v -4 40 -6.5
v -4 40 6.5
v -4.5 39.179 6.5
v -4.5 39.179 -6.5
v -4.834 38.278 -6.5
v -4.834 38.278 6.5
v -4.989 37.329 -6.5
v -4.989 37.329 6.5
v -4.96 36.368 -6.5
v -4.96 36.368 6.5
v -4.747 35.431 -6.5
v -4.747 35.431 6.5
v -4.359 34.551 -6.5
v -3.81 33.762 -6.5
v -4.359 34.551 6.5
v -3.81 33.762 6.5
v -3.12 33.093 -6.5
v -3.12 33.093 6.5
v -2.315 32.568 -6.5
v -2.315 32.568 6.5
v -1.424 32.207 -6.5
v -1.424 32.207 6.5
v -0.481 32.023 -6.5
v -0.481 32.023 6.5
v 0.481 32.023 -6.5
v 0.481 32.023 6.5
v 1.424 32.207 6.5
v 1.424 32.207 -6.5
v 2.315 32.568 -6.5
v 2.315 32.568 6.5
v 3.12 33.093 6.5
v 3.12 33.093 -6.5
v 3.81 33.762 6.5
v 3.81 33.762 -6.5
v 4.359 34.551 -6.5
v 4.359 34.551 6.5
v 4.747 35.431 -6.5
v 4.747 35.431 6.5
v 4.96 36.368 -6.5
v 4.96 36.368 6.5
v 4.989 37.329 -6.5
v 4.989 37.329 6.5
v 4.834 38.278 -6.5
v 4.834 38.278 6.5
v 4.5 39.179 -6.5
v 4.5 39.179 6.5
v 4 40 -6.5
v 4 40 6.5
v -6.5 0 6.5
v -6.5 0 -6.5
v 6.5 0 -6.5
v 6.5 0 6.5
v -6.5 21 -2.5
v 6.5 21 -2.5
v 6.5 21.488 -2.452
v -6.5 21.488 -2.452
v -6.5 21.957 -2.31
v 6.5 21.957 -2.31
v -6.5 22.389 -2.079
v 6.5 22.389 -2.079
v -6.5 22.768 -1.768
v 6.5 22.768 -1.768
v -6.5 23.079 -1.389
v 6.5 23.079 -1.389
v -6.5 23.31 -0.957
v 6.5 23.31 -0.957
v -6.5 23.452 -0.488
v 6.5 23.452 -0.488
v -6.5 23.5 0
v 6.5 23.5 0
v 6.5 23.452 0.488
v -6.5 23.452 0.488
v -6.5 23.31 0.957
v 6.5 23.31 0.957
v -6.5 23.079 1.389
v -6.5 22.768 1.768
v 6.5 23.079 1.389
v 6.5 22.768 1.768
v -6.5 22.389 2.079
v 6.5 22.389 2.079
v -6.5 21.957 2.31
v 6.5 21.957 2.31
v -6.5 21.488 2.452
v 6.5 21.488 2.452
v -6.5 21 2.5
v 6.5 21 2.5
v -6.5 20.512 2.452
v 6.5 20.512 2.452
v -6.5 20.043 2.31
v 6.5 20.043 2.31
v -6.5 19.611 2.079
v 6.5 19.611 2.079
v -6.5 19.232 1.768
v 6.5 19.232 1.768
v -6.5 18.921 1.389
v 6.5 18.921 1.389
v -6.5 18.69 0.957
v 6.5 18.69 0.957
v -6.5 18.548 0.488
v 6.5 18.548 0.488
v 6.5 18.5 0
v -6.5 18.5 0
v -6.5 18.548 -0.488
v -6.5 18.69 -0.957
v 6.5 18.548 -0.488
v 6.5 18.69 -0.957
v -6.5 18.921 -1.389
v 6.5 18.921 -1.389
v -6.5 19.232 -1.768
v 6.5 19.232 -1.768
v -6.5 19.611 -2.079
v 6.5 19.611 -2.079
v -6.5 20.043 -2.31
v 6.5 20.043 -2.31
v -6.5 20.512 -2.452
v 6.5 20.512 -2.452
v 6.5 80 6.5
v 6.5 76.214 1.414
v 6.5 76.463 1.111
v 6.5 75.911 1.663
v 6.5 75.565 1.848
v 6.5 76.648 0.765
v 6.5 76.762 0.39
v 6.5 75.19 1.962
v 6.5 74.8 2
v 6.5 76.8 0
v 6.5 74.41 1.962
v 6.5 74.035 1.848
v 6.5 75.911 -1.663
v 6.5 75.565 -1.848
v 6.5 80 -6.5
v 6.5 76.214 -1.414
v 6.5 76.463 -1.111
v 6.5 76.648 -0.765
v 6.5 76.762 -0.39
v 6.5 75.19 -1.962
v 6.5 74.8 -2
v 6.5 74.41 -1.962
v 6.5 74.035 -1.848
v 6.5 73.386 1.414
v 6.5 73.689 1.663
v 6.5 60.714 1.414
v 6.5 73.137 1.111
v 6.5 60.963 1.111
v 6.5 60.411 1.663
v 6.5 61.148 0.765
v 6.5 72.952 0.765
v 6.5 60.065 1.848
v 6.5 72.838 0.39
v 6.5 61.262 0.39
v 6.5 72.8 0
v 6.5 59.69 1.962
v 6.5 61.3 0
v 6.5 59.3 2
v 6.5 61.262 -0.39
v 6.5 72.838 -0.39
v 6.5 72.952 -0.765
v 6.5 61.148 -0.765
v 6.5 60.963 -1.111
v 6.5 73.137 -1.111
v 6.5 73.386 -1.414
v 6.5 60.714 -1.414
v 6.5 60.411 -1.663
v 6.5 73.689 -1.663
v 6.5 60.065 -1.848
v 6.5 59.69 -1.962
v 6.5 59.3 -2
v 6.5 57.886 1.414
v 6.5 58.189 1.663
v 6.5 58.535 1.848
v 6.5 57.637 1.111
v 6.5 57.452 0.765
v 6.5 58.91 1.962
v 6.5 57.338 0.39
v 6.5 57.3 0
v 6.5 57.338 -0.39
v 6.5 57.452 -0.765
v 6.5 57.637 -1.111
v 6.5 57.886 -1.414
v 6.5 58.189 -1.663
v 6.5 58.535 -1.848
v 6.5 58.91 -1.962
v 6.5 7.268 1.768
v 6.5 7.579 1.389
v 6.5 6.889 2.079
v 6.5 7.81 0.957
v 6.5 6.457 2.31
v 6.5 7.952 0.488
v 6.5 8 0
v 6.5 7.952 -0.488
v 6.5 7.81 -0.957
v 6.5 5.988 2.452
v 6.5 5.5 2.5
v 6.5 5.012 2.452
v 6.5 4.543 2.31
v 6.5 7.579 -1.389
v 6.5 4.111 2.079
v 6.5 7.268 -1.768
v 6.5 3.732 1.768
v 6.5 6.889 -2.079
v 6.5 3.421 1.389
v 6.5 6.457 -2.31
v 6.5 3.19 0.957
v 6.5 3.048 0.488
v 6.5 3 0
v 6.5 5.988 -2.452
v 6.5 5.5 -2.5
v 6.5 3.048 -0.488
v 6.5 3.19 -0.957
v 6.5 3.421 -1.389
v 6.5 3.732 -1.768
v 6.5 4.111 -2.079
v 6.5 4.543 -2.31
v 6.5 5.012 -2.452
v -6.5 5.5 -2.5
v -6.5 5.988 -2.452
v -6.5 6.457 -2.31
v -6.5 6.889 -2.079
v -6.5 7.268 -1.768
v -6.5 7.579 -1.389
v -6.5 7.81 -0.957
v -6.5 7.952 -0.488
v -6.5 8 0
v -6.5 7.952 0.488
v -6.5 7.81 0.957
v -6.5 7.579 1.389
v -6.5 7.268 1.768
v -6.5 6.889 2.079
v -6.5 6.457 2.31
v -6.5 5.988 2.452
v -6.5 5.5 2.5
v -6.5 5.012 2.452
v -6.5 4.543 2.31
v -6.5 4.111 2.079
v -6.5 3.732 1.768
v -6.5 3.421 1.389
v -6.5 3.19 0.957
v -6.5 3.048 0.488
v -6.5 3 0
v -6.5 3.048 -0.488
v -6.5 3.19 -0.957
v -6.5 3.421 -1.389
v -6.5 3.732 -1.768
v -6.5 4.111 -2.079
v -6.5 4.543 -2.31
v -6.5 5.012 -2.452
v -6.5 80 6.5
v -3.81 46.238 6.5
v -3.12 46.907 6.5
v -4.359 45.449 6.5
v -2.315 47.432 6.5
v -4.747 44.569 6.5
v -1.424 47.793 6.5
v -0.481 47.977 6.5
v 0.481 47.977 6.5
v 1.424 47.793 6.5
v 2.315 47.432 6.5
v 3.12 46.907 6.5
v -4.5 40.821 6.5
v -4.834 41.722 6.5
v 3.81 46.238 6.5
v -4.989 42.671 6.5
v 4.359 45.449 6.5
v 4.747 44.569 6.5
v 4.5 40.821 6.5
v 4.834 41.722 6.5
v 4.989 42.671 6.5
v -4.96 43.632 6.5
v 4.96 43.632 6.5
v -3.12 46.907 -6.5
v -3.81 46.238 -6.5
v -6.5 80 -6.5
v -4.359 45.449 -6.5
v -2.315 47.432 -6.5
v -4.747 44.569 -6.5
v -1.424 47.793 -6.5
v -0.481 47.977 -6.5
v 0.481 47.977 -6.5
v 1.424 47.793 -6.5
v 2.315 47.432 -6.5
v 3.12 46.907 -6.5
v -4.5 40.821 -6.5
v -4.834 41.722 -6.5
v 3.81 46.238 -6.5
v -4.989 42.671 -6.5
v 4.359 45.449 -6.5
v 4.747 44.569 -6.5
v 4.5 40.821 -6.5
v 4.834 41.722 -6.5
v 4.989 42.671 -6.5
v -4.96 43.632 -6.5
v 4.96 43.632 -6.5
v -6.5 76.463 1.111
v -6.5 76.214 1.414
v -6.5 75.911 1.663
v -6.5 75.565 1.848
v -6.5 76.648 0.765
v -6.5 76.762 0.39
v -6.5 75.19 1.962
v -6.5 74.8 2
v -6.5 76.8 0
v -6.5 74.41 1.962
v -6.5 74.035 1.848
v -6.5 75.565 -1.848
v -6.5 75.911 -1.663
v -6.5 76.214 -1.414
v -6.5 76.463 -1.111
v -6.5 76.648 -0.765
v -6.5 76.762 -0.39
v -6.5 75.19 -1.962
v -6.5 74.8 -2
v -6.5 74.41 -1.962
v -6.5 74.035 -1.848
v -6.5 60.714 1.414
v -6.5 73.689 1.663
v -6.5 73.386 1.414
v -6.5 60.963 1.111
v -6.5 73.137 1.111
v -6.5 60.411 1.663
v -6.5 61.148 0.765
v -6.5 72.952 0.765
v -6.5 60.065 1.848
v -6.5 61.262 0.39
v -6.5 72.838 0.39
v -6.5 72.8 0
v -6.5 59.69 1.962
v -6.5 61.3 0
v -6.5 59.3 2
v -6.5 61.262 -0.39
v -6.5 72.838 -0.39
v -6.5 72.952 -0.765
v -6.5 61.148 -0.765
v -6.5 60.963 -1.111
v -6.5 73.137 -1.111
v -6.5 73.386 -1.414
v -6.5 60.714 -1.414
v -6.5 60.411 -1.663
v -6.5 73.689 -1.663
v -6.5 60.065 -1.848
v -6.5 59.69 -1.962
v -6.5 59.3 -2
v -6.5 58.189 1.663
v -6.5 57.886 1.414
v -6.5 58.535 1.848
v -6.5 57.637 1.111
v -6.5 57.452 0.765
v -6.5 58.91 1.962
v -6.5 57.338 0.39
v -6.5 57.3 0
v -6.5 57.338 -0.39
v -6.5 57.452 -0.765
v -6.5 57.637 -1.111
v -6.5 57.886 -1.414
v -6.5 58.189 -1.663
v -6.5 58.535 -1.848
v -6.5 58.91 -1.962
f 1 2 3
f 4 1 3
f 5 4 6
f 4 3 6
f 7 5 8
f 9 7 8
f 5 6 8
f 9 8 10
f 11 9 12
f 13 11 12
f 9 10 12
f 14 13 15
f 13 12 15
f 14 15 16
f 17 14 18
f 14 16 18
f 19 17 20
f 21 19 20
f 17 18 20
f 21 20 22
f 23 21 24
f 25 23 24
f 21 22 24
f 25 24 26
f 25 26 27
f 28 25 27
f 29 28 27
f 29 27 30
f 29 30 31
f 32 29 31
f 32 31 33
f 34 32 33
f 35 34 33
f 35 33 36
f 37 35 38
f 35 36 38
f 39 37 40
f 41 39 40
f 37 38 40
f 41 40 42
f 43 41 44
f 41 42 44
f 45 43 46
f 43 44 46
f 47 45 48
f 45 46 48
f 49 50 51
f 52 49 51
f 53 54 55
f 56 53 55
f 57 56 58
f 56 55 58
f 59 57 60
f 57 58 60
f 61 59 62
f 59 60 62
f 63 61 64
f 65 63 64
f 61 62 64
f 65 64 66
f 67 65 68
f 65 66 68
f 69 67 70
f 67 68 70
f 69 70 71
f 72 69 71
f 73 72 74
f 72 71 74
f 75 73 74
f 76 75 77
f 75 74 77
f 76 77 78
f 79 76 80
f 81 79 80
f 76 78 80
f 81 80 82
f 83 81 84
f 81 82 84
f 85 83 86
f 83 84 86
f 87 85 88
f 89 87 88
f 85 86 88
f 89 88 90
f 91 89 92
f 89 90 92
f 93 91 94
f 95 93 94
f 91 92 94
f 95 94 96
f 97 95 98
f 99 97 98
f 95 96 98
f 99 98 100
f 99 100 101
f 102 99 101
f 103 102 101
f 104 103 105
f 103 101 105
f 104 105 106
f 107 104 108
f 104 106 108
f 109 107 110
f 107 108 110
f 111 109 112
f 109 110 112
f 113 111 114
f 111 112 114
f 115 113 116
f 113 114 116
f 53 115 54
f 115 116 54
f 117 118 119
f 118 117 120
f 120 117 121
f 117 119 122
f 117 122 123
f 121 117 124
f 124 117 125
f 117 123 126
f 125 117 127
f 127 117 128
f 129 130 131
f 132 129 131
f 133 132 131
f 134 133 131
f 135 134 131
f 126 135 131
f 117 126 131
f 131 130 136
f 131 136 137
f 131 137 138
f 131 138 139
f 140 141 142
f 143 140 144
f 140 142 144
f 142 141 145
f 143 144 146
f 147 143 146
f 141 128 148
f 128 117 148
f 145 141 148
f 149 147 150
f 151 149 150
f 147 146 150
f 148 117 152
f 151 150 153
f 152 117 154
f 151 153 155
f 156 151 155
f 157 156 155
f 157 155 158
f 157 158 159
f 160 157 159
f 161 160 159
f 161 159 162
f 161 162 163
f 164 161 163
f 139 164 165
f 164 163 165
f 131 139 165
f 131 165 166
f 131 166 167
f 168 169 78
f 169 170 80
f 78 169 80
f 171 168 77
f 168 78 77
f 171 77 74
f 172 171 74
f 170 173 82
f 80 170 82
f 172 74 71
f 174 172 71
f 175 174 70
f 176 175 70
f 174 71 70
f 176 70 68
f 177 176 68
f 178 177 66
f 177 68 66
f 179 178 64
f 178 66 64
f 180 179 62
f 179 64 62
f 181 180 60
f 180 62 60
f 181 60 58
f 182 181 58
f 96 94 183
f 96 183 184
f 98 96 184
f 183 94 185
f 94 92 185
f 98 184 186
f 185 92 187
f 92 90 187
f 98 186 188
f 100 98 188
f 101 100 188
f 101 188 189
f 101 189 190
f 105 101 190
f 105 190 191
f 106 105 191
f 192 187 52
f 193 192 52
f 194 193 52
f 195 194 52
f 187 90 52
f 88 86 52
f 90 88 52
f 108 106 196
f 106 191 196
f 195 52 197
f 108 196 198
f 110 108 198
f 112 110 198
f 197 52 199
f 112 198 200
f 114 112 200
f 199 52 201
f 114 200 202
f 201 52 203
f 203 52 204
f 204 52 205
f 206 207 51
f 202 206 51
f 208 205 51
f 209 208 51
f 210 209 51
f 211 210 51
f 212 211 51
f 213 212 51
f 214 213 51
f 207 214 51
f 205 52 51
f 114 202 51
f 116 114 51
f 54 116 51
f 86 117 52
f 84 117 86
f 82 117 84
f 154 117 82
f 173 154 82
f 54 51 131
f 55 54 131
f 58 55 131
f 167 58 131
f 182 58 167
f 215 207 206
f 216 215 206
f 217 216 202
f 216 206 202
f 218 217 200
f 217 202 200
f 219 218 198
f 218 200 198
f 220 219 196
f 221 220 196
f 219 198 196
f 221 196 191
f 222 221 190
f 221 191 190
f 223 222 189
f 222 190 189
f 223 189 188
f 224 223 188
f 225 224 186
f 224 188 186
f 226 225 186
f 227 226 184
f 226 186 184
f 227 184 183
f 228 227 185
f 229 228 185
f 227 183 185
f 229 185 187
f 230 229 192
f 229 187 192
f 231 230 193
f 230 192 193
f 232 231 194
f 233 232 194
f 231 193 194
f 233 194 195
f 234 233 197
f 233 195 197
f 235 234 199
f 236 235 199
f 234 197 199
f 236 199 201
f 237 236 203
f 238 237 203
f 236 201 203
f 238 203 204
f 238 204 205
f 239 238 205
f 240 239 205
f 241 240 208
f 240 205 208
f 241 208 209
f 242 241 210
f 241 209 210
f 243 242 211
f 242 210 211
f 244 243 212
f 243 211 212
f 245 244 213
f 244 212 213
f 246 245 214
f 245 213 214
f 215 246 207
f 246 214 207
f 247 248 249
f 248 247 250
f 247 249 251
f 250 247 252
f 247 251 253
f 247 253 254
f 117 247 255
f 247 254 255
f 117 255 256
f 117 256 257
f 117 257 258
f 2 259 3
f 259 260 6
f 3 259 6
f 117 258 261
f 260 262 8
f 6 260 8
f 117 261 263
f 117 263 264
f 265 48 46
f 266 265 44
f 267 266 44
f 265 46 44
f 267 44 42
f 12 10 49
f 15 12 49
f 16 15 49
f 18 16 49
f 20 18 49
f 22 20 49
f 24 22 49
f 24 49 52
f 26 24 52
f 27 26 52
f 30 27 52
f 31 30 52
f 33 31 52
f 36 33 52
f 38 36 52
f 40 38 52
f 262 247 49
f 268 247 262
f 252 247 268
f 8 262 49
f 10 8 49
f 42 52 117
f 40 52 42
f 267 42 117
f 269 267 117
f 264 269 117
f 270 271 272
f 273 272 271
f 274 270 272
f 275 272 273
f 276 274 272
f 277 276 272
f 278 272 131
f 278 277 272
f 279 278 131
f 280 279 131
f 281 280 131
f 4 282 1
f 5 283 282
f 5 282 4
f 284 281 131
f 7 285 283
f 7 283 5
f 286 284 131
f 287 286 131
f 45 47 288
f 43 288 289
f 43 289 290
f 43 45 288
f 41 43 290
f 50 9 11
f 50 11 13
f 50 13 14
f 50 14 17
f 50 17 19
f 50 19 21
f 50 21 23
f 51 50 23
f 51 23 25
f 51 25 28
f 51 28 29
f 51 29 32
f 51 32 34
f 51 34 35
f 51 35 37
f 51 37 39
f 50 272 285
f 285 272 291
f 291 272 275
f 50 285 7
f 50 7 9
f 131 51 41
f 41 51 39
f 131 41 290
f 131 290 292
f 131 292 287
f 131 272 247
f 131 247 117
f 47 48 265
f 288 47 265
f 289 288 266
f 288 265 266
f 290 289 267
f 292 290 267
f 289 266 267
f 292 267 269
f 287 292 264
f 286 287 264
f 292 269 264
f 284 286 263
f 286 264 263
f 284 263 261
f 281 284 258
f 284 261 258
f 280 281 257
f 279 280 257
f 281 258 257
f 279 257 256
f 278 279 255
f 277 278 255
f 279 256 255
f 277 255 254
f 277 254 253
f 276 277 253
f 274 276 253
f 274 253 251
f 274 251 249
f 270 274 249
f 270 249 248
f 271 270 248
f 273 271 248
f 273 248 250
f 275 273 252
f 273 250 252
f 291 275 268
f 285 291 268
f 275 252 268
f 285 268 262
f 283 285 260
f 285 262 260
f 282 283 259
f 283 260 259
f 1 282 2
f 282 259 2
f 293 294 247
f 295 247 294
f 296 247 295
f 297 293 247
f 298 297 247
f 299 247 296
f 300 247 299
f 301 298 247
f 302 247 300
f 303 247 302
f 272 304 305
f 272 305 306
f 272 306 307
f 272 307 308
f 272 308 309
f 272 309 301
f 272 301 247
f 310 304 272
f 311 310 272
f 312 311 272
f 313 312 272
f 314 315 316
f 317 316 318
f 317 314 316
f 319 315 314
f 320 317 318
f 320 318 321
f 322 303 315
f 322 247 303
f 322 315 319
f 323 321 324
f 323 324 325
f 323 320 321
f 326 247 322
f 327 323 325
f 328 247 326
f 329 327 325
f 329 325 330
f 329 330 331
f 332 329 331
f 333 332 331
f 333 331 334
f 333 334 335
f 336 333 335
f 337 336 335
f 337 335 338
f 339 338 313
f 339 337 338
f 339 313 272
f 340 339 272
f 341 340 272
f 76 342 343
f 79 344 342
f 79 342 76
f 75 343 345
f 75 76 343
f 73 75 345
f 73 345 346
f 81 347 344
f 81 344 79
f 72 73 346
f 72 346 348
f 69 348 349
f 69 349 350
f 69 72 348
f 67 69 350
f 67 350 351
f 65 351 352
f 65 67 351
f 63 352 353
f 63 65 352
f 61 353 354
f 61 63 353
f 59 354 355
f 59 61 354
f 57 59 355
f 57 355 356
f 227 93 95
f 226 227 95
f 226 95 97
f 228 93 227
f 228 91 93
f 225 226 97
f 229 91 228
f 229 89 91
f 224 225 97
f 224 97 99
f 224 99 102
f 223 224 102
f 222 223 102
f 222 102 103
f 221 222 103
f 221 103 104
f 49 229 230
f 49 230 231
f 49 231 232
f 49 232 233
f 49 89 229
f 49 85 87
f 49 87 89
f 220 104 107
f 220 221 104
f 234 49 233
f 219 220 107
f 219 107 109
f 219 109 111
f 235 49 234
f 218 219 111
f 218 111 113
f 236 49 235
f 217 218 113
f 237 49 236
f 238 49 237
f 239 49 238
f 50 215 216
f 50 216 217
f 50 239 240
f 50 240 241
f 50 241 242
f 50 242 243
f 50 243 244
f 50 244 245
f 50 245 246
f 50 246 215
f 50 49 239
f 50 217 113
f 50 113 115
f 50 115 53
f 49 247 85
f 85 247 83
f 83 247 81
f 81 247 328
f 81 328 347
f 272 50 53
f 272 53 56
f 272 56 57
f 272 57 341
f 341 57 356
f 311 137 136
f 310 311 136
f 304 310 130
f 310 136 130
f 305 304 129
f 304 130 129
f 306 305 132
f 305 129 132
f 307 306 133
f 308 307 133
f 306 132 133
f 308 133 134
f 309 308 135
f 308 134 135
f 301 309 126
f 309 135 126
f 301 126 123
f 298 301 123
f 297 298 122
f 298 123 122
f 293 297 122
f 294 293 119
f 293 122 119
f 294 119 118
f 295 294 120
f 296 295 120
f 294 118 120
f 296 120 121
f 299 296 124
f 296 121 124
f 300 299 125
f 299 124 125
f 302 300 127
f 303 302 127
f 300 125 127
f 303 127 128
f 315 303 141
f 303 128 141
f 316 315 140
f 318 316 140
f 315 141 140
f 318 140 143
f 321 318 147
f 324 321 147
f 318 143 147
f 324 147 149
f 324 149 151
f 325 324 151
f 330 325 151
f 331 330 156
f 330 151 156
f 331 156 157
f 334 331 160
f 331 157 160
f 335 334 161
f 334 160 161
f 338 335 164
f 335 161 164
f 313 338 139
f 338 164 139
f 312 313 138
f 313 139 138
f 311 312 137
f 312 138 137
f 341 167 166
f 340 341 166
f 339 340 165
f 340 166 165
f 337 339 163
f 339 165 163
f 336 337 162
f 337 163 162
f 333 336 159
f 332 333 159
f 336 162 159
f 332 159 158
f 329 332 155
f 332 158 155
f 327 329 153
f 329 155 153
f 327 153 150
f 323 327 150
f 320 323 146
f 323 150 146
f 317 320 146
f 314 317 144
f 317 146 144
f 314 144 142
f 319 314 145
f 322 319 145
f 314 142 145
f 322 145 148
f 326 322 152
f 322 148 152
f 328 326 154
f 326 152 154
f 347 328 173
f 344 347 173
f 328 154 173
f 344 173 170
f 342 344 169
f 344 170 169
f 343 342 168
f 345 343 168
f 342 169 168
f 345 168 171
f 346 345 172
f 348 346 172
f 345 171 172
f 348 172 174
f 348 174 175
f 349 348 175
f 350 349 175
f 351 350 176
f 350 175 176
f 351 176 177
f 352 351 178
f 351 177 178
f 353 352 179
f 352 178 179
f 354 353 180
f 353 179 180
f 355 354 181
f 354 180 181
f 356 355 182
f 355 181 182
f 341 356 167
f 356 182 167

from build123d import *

# Parameters (mm, degrees)
SKETCH1_W           = 13
SKETCH1_H           = 13
BOSS_EXTRUDE1_DEPTH = 80
CUT_EXTRUDE1_DEPTH  = 13
SKETCH3_R           = 2
SKETCH3_R_2         = 2.5
CUT_EXTRUDE2_DEPTH  = 13


with BuildPart() as part:
    # Sketch1 → Boss-Extrude1 (new body)
    with BuildSketch(Plane(origin=(0, 0, 0), x_dir=(1, 0, 0), z_dir=(0, 1, 0))):
        Rectangle(SKETCH1_W, SKETCH1_H)
    extrude(amount=BOSS_EXTRUDE1_DEPTH)

    # Sketch2 → Cut-Extrude1 (cut)
    with BuildSketch(Plane.XY.offset(6.5)):
        with BuildLine():
            ThreePointArc((-4, 40), (0, 32), (4, 40))
            ThreePointArc((4, 40), (0, 48), (-4, 40))
        make_face()
    extrude(amount=-CUT_EXTRUDE1_DEPTH, mode=Mode.SUBTRACT)

    # Sketch3 → Cut-Extrude2 (cut)
    with BuildSketch(Plane(origin=(6.5, 0, 0), x_dir=(0, 0, -1), z_dir=(1, 0, 0))):
        with Locations((0, 74.8)):
            Circle(SKETCH3_R)
        with Locations((0, 59.3)):
            Circle(SKETCH3_R)
        with Locations((0, 21)):
            Circle(SKETCH3_R_2)
        with Locations((0, 5.5)):
            Circle(SKETCH3_R_2)
    extrude(amount=-CUT_EXTRUDE2_DEPTH, mode=Mode.SUBTRACT)


solid = part.part
